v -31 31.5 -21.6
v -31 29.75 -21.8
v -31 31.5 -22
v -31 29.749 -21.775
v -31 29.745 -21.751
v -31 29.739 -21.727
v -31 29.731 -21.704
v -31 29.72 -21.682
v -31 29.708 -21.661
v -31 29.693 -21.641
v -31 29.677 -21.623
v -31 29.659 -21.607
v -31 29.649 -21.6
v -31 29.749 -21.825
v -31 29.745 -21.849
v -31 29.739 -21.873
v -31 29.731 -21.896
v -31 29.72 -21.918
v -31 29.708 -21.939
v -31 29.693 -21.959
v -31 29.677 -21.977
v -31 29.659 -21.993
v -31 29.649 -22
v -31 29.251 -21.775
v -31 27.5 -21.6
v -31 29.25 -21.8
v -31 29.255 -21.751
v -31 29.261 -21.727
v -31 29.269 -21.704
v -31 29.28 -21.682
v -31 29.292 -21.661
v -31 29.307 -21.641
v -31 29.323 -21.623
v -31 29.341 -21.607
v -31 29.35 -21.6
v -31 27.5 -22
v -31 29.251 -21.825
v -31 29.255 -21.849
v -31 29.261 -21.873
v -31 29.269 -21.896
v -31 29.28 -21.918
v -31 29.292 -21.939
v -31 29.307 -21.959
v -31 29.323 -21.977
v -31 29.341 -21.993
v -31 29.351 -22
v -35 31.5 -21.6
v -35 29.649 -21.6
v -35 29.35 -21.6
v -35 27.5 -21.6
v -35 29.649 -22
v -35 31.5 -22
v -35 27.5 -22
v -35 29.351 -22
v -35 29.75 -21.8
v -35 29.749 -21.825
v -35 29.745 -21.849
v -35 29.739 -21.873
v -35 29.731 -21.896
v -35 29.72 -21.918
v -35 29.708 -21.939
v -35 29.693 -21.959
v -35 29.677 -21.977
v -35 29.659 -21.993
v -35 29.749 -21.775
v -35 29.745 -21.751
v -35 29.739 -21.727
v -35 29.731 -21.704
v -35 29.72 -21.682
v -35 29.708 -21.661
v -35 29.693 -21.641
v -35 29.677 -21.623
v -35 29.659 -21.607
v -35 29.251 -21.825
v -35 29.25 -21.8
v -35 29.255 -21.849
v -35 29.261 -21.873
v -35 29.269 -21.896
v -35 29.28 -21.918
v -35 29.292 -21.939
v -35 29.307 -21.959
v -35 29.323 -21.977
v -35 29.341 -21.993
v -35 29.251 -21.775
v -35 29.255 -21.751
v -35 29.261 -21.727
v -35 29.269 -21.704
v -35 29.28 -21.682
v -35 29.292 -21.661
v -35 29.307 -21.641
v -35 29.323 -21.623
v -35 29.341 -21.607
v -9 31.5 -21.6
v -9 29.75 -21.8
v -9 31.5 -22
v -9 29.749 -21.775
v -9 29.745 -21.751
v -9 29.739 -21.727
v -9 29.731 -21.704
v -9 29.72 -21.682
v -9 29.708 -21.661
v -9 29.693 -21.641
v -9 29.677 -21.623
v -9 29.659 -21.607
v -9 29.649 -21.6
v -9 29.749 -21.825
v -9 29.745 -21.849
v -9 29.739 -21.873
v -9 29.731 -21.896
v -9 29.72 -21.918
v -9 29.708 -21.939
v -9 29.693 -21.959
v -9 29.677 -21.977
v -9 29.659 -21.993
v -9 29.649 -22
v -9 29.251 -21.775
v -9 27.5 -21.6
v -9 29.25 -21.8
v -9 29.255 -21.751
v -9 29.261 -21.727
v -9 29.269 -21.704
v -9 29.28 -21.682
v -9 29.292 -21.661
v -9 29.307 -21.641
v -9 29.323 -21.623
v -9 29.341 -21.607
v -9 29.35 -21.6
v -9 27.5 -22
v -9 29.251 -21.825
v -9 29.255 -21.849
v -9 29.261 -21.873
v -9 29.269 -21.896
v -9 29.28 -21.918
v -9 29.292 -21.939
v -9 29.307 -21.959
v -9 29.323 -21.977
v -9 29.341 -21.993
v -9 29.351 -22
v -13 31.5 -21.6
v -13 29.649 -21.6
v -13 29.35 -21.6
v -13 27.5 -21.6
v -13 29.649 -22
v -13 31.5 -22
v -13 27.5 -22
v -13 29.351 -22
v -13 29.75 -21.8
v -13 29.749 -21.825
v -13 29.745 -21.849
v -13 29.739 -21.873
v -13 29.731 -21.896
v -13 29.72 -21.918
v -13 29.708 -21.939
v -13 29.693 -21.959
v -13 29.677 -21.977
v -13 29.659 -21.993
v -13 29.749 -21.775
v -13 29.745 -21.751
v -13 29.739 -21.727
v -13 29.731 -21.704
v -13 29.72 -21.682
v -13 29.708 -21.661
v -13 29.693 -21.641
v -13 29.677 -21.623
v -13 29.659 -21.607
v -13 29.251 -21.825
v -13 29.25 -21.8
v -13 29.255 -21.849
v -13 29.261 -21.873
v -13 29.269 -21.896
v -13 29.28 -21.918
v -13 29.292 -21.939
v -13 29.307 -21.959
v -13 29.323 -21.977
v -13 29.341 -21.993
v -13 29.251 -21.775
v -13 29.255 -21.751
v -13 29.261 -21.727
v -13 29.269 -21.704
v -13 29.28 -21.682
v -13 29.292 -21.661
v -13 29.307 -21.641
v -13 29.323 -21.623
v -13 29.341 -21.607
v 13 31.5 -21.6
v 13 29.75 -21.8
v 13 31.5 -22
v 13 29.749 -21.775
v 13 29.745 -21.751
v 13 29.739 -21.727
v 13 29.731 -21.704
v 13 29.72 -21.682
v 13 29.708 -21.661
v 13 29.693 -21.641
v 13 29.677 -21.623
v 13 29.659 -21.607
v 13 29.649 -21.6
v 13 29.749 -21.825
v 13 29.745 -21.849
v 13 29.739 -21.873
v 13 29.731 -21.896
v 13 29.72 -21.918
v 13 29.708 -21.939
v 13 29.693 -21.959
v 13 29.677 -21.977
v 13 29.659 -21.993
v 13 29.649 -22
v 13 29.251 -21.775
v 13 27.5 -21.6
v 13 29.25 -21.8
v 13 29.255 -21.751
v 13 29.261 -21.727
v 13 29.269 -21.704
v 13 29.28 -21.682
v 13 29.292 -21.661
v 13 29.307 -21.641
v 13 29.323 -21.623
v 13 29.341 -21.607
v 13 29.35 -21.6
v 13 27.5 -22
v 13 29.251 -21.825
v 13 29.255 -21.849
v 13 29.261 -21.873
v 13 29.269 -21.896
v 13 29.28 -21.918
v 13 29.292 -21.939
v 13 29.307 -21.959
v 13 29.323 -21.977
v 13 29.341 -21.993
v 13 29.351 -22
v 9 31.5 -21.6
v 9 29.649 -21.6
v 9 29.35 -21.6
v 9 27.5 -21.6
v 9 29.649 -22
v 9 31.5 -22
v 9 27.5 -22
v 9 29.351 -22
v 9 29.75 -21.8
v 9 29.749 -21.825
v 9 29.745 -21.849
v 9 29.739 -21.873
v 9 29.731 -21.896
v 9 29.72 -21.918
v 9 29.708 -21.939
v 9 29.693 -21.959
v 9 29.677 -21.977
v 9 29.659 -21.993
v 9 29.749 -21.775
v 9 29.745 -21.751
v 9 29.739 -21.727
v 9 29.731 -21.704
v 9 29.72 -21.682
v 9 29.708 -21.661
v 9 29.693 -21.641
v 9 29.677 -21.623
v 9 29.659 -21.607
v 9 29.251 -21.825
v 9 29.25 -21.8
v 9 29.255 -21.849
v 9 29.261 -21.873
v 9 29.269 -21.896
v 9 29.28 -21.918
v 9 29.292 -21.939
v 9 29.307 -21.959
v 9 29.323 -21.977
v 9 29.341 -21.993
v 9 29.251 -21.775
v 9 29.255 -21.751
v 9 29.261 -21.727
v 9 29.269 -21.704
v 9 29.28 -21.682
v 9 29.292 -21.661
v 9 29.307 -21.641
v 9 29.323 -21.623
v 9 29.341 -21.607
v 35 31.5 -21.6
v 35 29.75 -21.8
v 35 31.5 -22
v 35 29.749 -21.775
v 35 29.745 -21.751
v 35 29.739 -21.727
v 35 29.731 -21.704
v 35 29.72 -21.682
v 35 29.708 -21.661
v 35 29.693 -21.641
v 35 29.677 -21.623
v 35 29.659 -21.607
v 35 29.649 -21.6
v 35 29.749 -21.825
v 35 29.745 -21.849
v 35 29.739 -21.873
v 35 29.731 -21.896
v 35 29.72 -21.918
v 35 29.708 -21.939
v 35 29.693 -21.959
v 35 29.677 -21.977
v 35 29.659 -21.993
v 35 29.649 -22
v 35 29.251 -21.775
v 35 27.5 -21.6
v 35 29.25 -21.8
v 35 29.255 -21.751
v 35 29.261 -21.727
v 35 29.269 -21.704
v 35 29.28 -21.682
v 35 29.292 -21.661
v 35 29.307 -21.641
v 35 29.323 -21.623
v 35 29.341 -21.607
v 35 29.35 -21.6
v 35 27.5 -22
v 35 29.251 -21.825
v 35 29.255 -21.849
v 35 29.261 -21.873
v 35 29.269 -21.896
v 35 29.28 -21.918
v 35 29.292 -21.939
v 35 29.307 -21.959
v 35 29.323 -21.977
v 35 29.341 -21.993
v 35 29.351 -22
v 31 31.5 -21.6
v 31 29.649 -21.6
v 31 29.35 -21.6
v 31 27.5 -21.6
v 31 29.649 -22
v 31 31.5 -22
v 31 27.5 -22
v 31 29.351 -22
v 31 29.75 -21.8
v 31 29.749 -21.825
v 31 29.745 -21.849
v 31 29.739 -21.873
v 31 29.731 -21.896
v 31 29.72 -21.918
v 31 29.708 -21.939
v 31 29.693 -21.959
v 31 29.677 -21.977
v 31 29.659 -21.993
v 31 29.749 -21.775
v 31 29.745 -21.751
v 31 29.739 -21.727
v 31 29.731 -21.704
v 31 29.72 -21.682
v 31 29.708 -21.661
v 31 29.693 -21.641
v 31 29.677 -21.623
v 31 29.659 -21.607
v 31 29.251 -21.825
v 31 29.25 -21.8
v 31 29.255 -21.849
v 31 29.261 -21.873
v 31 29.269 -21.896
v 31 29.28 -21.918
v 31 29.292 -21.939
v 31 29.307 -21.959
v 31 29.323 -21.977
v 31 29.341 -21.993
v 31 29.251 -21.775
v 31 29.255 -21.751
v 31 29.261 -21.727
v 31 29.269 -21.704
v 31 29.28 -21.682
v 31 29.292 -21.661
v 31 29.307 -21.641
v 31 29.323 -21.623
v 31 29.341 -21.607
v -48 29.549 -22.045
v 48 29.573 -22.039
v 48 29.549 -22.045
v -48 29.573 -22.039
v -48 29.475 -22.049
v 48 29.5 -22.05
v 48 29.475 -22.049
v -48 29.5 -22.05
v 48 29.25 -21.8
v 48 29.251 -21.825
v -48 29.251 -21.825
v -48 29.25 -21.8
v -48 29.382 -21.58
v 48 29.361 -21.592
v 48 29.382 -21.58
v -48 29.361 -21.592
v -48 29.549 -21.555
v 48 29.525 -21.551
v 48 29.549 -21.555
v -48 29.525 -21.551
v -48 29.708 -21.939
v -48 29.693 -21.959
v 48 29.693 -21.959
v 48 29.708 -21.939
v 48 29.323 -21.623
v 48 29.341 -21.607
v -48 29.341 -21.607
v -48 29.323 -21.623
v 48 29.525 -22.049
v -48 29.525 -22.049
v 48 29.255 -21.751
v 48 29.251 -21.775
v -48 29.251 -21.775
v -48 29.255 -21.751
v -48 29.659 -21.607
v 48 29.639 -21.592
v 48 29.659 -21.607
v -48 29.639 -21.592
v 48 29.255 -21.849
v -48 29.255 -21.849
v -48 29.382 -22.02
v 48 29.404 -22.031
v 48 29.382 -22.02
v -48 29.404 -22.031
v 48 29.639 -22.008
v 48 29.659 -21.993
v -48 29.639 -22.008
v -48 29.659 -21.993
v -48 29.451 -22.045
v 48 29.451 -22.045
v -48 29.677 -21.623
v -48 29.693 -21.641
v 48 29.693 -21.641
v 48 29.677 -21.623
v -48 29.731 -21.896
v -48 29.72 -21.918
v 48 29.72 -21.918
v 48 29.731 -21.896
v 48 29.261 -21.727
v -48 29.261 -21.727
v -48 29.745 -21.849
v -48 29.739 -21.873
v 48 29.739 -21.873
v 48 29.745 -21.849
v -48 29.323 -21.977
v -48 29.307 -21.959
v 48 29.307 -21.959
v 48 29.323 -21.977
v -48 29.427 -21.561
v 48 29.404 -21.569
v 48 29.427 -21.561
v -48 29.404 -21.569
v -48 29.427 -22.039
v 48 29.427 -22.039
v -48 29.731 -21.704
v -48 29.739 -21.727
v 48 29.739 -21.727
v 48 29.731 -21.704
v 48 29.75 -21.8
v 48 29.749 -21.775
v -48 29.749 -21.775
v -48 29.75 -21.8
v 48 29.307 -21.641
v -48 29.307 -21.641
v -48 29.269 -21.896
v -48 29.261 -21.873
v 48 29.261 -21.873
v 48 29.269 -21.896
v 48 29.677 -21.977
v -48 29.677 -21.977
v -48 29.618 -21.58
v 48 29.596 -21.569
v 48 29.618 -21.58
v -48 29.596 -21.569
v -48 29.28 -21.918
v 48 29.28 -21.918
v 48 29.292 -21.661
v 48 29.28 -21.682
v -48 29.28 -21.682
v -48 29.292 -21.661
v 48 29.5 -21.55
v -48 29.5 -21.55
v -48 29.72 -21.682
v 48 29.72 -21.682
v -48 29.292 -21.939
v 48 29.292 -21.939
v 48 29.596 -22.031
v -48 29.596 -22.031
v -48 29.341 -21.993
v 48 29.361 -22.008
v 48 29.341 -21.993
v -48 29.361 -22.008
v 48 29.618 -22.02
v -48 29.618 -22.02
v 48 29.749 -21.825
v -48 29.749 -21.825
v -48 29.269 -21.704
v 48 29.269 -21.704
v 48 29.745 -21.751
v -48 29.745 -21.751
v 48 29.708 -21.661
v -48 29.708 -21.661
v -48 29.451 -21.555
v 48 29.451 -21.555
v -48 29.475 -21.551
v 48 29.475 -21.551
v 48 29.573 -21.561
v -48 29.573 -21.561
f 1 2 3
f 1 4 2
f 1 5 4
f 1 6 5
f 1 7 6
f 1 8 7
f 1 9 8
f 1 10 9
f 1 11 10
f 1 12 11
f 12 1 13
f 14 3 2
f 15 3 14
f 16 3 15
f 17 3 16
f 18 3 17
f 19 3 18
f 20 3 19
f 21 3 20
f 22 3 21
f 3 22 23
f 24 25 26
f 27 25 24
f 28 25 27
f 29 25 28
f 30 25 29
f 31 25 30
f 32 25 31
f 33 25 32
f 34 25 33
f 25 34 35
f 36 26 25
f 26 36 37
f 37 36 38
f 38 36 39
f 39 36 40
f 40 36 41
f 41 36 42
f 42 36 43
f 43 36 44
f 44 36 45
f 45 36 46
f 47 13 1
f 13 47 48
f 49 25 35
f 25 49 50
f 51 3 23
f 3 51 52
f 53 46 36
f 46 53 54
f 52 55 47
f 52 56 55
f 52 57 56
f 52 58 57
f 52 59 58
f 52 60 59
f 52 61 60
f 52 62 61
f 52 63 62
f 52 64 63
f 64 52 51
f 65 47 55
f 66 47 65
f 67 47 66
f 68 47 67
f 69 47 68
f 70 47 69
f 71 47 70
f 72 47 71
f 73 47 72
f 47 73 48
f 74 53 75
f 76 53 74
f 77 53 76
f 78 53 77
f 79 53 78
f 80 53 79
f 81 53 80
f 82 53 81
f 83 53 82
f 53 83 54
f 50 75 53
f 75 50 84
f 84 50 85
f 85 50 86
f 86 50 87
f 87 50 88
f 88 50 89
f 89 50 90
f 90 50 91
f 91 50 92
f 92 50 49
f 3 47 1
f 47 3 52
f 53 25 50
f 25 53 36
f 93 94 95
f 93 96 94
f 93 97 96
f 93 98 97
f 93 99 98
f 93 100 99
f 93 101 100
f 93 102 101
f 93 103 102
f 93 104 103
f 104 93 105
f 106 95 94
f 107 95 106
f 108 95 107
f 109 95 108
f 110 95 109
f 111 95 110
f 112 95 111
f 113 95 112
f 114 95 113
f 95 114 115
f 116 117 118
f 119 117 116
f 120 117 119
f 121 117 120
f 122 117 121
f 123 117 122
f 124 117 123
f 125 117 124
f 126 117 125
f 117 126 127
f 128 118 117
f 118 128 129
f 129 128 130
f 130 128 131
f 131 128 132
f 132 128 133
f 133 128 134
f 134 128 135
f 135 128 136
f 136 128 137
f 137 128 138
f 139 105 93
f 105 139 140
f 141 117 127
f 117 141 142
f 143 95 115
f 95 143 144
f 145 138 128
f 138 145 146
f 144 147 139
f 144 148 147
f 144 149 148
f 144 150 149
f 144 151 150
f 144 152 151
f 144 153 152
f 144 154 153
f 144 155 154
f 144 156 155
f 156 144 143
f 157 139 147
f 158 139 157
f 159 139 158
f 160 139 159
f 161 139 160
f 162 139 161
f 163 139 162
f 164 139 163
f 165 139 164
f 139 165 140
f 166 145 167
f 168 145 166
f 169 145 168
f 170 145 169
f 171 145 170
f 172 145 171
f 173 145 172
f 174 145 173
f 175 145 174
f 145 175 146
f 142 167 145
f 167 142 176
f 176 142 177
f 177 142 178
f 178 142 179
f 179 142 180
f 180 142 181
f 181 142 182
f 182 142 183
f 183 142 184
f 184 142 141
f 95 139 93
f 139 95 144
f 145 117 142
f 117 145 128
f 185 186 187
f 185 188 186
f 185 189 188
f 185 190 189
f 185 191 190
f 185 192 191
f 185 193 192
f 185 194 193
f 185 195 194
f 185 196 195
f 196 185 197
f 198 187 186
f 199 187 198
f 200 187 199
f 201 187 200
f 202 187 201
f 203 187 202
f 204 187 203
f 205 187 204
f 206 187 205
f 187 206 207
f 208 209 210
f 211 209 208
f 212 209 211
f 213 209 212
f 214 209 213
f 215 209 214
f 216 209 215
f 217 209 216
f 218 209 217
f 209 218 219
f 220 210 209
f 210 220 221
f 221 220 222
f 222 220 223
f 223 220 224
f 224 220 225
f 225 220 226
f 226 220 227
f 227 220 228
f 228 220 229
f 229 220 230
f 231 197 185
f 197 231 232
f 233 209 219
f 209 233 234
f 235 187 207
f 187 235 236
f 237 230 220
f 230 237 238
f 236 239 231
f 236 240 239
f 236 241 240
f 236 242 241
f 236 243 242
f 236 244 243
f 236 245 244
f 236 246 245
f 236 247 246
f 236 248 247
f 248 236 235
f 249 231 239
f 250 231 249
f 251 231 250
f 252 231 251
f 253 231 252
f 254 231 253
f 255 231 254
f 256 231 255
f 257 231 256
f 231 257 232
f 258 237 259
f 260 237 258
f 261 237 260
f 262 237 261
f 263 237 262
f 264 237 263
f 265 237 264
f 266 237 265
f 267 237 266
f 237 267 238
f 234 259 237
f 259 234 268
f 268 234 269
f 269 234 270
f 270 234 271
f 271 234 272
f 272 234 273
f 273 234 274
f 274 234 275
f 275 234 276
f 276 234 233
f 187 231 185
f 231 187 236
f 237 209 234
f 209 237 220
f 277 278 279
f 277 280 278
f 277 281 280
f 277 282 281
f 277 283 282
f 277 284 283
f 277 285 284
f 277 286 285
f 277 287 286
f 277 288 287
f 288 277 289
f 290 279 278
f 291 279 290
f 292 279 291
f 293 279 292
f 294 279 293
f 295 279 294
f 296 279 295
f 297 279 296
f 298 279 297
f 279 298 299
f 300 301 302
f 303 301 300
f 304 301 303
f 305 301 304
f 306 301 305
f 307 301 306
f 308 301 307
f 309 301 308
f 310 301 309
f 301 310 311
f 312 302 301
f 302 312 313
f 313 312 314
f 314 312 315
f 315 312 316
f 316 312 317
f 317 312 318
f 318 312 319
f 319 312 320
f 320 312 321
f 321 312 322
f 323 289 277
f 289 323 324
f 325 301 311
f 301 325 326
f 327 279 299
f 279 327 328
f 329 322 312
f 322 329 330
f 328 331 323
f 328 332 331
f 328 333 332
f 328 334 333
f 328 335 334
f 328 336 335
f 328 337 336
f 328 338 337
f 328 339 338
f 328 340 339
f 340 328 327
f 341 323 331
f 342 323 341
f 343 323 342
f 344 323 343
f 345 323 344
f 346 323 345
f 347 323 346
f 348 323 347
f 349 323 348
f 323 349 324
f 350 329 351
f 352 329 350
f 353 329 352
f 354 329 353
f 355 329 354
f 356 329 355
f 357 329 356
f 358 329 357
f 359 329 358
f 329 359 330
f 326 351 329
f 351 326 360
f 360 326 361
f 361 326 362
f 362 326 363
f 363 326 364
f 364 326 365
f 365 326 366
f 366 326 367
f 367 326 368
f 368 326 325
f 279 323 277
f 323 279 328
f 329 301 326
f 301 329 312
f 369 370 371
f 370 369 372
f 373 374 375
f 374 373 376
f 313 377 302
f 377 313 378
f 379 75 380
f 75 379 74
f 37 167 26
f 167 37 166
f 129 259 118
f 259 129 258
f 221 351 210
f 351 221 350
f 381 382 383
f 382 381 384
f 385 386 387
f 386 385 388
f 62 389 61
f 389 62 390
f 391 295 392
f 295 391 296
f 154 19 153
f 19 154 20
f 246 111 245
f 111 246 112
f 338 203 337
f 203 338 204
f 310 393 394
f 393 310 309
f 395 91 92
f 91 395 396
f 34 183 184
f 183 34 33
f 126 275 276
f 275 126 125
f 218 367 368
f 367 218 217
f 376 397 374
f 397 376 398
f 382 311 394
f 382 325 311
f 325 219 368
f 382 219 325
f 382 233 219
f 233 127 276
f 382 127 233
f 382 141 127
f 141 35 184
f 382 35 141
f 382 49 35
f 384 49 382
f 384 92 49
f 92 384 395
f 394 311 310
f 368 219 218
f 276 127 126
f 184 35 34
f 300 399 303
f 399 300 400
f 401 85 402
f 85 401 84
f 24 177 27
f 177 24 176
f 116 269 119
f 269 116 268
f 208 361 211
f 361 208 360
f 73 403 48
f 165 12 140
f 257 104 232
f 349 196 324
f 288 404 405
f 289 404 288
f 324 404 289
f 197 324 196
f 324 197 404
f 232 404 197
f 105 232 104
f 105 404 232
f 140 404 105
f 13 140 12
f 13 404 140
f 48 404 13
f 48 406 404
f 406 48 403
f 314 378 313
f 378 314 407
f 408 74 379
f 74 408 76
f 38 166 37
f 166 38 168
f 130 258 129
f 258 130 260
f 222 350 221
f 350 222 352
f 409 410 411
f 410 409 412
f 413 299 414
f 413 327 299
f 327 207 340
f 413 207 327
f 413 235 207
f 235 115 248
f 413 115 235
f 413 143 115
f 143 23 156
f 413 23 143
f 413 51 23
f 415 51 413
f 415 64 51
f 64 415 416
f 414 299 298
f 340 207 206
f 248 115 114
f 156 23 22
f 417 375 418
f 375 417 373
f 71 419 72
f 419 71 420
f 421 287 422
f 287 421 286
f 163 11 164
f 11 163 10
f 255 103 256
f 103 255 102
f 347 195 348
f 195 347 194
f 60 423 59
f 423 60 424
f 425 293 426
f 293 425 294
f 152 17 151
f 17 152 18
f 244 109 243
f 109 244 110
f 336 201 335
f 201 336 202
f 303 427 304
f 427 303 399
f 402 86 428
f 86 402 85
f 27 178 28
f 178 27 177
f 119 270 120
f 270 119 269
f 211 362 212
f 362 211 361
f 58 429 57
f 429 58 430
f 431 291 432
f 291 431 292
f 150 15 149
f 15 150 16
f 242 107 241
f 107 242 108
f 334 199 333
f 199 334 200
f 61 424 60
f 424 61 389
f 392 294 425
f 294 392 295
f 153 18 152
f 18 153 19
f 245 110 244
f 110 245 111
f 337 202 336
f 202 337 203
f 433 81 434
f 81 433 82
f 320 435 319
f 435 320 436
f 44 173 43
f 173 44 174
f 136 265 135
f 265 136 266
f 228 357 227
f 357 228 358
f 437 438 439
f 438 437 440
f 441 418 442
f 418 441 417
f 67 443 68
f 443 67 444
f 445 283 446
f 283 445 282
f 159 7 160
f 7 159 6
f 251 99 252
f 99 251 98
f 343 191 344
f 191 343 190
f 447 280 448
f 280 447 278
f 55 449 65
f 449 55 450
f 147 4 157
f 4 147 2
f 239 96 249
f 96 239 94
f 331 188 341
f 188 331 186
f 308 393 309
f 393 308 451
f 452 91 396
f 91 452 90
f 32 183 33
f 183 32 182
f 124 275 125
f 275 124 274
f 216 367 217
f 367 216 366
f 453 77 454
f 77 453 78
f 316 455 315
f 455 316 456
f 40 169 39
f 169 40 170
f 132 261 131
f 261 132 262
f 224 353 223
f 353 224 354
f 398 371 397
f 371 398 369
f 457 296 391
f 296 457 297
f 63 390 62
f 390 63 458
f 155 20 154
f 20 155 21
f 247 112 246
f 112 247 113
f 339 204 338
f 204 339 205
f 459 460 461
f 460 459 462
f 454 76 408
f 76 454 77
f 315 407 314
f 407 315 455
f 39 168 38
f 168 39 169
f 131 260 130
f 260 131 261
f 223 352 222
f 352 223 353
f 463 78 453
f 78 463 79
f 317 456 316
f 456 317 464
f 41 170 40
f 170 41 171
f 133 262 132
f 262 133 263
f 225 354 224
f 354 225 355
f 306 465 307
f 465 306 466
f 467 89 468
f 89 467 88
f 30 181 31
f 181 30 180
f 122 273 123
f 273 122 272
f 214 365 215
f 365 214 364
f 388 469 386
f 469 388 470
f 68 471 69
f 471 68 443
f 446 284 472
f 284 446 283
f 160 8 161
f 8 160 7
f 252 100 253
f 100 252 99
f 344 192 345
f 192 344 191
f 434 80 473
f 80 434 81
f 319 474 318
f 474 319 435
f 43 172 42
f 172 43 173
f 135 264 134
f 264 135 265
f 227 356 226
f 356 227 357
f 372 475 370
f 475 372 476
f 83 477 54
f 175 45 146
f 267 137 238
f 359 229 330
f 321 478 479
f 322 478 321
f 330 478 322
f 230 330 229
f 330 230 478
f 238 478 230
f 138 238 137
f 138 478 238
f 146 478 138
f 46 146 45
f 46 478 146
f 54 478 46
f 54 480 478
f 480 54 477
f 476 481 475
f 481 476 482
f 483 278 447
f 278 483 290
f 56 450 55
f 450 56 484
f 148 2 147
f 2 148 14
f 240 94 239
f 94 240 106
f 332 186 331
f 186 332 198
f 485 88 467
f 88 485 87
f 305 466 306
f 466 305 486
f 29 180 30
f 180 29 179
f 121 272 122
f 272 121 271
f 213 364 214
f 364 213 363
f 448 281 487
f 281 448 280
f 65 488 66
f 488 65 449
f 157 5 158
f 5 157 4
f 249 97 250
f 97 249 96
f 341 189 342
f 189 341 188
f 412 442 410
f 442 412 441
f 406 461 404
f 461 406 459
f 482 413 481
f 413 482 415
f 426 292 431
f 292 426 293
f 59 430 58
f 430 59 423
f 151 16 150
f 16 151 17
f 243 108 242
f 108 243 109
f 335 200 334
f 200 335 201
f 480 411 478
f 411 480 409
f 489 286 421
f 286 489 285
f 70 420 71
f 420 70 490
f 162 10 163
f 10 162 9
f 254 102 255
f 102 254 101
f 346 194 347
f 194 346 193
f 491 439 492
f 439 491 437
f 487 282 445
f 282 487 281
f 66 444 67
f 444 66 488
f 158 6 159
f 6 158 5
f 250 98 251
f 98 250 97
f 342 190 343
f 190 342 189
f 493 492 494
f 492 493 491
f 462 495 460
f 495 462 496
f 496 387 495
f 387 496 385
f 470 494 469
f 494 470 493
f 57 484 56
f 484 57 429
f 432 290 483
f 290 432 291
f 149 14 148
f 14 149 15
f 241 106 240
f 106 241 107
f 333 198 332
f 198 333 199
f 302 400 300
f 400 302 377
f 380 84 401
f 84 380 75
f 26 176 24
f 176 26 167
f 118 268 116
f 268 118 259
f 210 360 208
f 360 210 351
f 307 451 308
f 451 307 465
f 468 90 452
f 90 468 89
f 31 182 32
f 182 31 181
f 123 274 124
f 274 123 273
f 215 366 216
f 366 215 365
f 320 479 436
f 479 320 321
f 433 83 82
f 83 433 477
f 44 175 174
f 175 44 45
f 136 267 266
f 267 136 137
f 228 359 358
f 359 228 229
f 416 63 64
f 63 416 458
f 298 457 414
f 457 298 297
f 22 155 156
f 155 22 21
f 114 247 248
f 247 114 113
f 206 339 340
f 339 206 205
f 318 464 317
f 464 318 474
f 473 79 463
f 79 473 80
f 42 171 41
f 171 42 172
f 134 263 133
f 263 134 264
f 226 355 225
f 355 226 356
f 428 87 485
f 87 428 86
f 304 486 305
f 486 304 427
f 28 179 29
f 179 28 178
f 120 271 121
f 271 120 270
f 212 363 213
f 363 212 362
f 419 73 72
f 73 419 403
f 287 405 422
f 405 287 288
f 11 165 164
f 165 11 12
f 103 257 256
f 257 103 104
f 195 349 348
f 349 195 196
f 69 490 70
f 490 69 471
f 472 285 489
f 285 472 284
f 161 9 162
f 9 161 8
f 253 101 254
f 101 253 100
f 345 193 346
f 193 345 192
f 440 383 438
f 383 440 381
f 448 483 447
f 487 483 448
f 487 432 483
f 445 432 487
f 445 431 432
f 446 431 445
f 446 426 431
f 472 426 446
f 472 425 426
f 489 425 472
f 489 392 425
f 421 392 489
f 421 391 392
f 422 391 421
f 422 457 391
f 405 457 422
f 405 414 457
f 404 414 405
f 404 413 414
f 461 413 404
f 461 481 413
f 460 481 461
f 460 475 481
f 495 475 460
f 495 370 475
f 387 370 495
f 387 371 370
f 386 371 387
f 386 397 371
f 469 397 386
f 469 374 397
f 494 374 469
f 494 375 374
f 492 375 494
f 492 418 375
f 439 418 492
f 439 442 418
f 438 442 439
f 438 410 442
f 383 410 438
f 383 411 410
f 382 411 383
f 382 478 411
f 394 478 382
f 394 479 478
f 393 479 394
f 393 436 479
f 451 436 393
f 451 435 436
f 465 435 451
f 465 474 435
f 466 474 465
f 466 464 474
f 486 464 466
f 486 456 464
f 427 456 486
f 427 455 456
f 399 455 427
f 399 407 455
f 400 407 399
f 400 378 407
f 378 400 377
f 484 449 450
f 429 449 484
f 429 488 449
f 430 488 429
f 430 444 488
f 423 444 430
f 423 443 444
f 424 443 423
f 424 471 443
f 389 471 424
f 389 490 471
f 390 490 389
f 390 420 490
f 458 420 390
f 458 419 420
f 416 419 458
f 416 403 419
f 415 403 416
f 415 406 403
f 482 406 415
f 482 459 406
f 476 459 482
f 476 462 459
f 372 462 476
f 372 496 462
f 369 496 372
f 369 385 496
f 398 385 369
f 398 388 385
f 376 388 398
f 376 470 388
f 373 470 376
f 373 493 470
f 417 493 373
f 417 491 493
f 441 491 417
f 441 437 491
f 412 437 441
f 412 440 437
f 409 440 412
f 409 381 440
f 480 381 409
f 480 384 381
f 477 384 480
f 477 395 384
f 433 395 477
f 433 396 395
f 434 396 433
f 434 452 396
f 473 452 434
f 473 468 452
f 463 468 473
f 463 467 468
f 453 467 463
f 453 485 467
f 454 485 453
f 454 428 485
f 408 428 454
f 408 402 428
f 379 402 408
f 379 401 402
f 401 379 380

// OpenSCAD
// file: ../wattplot_params.scad
// =============================================================================
// wattplot_params.scad -- mirror of wattplot_params.py
// =============================================================================
//
// DO NOT EDIT THESE NUMBERS WITHOUT UPDATING wattplot_params.py AND
// firmware/tests/test_openscad_params.py.
//
// The Python source of truth is wattplot_params.py at the repo root.
// This file is a hand-maintained mirror so the OpenSCAD models can
// render without Python. A CI test (test_openscad_params.py) reads
// both and fails if any number has drifted.
//
// If you change a value here, change it in wattplot_params.py first
// and update the test expectations in test_openscad_params.py. The
// commit message should reference the param name (e.g.
// "scad: bump POSTS.height_in to 78 for v3.1 storm margin").
//
// All dimensions are in inches. OpenSCAD's $fn controls mesh
// resolution -- 64 gives a clean STL that's about 2 MB at this
// model's complexity.

// ---------- LOCATION ----------
location_latitude  = 33.45;     // Phoenix, AZ
location_longitude = -112.07;
location_elevation_m = 337;
location_design_wind_mph = 115.0; // ASCE 7-22, Risk Cat II 700-yr

// ---------- PLANTER LIMITS ----------
max_planter_L_in = 96.0;          // 8 ft stock, no waste on long rails
max_planter_W_in = 60.0;          // 5 ft (8 ft cross-cut, 2 cross-rails per board)

// ---------- BED (planter, ballasted) ----------
bed_outer_L_in       = 96.0;       // 8 ft (capped at max_planter_L_in)
bed_outer_W_in       = 44.6;       // matches panel width
bed_wall_thk_in      = 0.75;       // 1x6 cedar (3/4" actual)
bed_wall_h_in        = 27.5;       // 5 courses of 1x6 (5.5" actual)
                                   //   wind-sized: SF_overturning 2.55 at 35°
bed_soil_fill_in     = 25.5;       // 2" freeboard below the rim
                                   //   ~60 cu ft = 2.2 cu yd = ~4,000 lb
bed_skid_h_in        = 1.5;        // walls rest on 2x4 footers
bed_skid_side_in     = 3.5;        // 4x nominal

// ---------- BED WALL (1x6 cedar skin over 2x4 cleats) ----------
wall_skin_thk_in   = 0.75;
wall_course_h_in   = 5.5;
wall_courses       = 5;            // 5 x 5.5" = 27.5" wall
wall_cleat_thk_in  = 1.5;          // 2x4 actual
wall_cleat_wid_in  = 3.5;          // 2x4 actual
wall_cleats_long   = 5;            // per long wall
wall_cleats_short  = 3;            // per short wall
wall_header_thk_in = 1.5;         // 2x4 on wide face
wall_header_wid_in = 3.5;

// ---------- POSTS (4x4 PT, 72" tall, walk-under canopy) ----------
post_thk_in  = 3.5;               // 4x4 actual
post_height_in = 72.0;            // 6 ft -- walk-under / reach-under
post_count   = 4;
post_rail_thk_in = 1.5;          // 2x6 on post tops
post_rail_wid_in = 5.5;

// ---------- PANEL (LONGi Hi-MO X10 620W default) ----------
panel_L_in        = 97.0;         // 8.08 ft (overhangs bed 0.5"/side)
panel_W_in        = 44.6;         // 3.72 ft
panel_thk_in      = 1.4;
panel_mass_lb     = 65.0;
panel_wattage     = 620;
panel_tilt_deg    = 35.0;         // 0 = flat, 35 = max (wind-limited)

// ---------- CONTROL (tilt cap + PI setpoint) ----------
control_max_tilt_deg  = 35.0;     // STRUCTURAL cap. See ADR-001.
control_target_current_A = 0.5;
control_hard_current_limit_A = 2.5;

// ---------- FRAME (perimeter around the panel) ----------
frame_long_rail_thk_in   = 1.5;    // 2x6 actual
frame_long_rail_wid_in   = 5.5;
frame_long_rail_length_in = 96.0;  // 8 ft stock, no waste

frame_cross_rail_thk_in   = 1.5;   // 2x6 actual
frame_cross_rail_wid_in   = 5.5;
frame_cross_rail_length_in = 42.0; // 2x6x8ft cut to 42"

frame_brace_thk_in   = 1.5;         // 2x4 actual
frame_brace_wid_in   = 3.5;
frame_brace_length_in = 102.0;     // 2x4x10ft cut to 102"

// ---------- HINGES + PANEL CLAMPS ----------
hinge_leaf_in    = 4.0;            // 4"x4" leaf, 1/2" pin
hinge_pin_d_in    = 0.5;
hinge_count      = 4;
hinge_spacing_in = 22.0;           // 22" o.c.
hinge_rod_length_in = 72.0;        // 1/2" x 72" steel rod (HD)

panel_clamp_length_in = 2.0;       // IronRidge mid-clamp, 35mm channel
panel_clamp_height_in = 2.0;
panel_clamp_thk_in   = 0.4;
panel_clamps_per_long_rail  = 2;
panel_clamps_per_cross_rail = 1;

// ---------- ACTUATOR MOUNT ----------
actuator_block_thk_in  = 1.5;      // 2x6 actual
actuator_block_wid_in  = 5.5;
actuator_block_length_in = 6.0;
actuator_stroke_in     = 4.0;       // 12V linear actuator
actuator_width_in      = 2.0;       // body width (for clearance check)
actuator_height_in     = 2.5;

// ---------- DERIVED (don't change) ----------
// Bed is sized so the panel overhangs the rails by 0.5" per side.
// The panel mid-clamps grip the aluminum frame, not the glass.
bed_inner_L_in = bed_outer_L_in - 2 * post_thk_in;
bed_inner_W_in = bed_outer_W_in - 2 * wall_skin_thk_in;
// Wall sits on top of skid; rim = wall + skid.
bed_rim_h_in = bed_wall_h_in + bed_skid_h_in;
// Panel frame offset above the bed rail (clearance for the clamp).
panel_clearance_in = 2.0;         // 2" above the rail top

// Render resolution: $fn controls segment count for curves.
// 64 gives a clean STL ~2 MB. Lower for fast preview, higher for
// 3D printing.
$fn = 64;
// main file
// =============================================================================
// parts/hinges.scad -- the 4 butt hinges + 1/2" steel rod (the pivot axis)
// =============================================================================

include <../wattplot_params.scad>

module hinges_assembly() {
    // Hinge axis Y position: top of the south wall, +1" up for the
    // hinge knuckle. The frame's south rail sits on this.
    hinge_y = bed_rim_h_in + 0.5;
    hinge_z = -bed_outer_W_in/2 + 0.5;  // 0.5" inboard of the wall outer face
    // Hinge leaves (just visual placeholders; the real hinge is
    // a 4"x4"x1/8" steel leaf with a 0.5" knuckle)
    for (i = [0:hinge_count-1]) {
        x = -hinge_spacing_in * (hinge_count-1) / 2 + i * hinge_spacing_in;
        color(col_hinge_default)
        translate([x, hinge_y, hinge_z])
            cube([hinge_leaf_in, hinge_leaf_in, 0.4], center=true);
    }
    // The 1/2" rod (visualized as a thin cylinder along the hinge axis)
    color(col_hinge_default)
    translate([0, hinge_y, hinge_z])
        rotate([0, 90, 0])
            cylinder(h=bed_outer_L_in, d=hinge_pin_d_in, center=true);
}

col_hinge_default = [0.60, 0.60, 0.65];

if (is_undef($use_only)) {
    $fn = 64;
    hinges_assembly();
}
